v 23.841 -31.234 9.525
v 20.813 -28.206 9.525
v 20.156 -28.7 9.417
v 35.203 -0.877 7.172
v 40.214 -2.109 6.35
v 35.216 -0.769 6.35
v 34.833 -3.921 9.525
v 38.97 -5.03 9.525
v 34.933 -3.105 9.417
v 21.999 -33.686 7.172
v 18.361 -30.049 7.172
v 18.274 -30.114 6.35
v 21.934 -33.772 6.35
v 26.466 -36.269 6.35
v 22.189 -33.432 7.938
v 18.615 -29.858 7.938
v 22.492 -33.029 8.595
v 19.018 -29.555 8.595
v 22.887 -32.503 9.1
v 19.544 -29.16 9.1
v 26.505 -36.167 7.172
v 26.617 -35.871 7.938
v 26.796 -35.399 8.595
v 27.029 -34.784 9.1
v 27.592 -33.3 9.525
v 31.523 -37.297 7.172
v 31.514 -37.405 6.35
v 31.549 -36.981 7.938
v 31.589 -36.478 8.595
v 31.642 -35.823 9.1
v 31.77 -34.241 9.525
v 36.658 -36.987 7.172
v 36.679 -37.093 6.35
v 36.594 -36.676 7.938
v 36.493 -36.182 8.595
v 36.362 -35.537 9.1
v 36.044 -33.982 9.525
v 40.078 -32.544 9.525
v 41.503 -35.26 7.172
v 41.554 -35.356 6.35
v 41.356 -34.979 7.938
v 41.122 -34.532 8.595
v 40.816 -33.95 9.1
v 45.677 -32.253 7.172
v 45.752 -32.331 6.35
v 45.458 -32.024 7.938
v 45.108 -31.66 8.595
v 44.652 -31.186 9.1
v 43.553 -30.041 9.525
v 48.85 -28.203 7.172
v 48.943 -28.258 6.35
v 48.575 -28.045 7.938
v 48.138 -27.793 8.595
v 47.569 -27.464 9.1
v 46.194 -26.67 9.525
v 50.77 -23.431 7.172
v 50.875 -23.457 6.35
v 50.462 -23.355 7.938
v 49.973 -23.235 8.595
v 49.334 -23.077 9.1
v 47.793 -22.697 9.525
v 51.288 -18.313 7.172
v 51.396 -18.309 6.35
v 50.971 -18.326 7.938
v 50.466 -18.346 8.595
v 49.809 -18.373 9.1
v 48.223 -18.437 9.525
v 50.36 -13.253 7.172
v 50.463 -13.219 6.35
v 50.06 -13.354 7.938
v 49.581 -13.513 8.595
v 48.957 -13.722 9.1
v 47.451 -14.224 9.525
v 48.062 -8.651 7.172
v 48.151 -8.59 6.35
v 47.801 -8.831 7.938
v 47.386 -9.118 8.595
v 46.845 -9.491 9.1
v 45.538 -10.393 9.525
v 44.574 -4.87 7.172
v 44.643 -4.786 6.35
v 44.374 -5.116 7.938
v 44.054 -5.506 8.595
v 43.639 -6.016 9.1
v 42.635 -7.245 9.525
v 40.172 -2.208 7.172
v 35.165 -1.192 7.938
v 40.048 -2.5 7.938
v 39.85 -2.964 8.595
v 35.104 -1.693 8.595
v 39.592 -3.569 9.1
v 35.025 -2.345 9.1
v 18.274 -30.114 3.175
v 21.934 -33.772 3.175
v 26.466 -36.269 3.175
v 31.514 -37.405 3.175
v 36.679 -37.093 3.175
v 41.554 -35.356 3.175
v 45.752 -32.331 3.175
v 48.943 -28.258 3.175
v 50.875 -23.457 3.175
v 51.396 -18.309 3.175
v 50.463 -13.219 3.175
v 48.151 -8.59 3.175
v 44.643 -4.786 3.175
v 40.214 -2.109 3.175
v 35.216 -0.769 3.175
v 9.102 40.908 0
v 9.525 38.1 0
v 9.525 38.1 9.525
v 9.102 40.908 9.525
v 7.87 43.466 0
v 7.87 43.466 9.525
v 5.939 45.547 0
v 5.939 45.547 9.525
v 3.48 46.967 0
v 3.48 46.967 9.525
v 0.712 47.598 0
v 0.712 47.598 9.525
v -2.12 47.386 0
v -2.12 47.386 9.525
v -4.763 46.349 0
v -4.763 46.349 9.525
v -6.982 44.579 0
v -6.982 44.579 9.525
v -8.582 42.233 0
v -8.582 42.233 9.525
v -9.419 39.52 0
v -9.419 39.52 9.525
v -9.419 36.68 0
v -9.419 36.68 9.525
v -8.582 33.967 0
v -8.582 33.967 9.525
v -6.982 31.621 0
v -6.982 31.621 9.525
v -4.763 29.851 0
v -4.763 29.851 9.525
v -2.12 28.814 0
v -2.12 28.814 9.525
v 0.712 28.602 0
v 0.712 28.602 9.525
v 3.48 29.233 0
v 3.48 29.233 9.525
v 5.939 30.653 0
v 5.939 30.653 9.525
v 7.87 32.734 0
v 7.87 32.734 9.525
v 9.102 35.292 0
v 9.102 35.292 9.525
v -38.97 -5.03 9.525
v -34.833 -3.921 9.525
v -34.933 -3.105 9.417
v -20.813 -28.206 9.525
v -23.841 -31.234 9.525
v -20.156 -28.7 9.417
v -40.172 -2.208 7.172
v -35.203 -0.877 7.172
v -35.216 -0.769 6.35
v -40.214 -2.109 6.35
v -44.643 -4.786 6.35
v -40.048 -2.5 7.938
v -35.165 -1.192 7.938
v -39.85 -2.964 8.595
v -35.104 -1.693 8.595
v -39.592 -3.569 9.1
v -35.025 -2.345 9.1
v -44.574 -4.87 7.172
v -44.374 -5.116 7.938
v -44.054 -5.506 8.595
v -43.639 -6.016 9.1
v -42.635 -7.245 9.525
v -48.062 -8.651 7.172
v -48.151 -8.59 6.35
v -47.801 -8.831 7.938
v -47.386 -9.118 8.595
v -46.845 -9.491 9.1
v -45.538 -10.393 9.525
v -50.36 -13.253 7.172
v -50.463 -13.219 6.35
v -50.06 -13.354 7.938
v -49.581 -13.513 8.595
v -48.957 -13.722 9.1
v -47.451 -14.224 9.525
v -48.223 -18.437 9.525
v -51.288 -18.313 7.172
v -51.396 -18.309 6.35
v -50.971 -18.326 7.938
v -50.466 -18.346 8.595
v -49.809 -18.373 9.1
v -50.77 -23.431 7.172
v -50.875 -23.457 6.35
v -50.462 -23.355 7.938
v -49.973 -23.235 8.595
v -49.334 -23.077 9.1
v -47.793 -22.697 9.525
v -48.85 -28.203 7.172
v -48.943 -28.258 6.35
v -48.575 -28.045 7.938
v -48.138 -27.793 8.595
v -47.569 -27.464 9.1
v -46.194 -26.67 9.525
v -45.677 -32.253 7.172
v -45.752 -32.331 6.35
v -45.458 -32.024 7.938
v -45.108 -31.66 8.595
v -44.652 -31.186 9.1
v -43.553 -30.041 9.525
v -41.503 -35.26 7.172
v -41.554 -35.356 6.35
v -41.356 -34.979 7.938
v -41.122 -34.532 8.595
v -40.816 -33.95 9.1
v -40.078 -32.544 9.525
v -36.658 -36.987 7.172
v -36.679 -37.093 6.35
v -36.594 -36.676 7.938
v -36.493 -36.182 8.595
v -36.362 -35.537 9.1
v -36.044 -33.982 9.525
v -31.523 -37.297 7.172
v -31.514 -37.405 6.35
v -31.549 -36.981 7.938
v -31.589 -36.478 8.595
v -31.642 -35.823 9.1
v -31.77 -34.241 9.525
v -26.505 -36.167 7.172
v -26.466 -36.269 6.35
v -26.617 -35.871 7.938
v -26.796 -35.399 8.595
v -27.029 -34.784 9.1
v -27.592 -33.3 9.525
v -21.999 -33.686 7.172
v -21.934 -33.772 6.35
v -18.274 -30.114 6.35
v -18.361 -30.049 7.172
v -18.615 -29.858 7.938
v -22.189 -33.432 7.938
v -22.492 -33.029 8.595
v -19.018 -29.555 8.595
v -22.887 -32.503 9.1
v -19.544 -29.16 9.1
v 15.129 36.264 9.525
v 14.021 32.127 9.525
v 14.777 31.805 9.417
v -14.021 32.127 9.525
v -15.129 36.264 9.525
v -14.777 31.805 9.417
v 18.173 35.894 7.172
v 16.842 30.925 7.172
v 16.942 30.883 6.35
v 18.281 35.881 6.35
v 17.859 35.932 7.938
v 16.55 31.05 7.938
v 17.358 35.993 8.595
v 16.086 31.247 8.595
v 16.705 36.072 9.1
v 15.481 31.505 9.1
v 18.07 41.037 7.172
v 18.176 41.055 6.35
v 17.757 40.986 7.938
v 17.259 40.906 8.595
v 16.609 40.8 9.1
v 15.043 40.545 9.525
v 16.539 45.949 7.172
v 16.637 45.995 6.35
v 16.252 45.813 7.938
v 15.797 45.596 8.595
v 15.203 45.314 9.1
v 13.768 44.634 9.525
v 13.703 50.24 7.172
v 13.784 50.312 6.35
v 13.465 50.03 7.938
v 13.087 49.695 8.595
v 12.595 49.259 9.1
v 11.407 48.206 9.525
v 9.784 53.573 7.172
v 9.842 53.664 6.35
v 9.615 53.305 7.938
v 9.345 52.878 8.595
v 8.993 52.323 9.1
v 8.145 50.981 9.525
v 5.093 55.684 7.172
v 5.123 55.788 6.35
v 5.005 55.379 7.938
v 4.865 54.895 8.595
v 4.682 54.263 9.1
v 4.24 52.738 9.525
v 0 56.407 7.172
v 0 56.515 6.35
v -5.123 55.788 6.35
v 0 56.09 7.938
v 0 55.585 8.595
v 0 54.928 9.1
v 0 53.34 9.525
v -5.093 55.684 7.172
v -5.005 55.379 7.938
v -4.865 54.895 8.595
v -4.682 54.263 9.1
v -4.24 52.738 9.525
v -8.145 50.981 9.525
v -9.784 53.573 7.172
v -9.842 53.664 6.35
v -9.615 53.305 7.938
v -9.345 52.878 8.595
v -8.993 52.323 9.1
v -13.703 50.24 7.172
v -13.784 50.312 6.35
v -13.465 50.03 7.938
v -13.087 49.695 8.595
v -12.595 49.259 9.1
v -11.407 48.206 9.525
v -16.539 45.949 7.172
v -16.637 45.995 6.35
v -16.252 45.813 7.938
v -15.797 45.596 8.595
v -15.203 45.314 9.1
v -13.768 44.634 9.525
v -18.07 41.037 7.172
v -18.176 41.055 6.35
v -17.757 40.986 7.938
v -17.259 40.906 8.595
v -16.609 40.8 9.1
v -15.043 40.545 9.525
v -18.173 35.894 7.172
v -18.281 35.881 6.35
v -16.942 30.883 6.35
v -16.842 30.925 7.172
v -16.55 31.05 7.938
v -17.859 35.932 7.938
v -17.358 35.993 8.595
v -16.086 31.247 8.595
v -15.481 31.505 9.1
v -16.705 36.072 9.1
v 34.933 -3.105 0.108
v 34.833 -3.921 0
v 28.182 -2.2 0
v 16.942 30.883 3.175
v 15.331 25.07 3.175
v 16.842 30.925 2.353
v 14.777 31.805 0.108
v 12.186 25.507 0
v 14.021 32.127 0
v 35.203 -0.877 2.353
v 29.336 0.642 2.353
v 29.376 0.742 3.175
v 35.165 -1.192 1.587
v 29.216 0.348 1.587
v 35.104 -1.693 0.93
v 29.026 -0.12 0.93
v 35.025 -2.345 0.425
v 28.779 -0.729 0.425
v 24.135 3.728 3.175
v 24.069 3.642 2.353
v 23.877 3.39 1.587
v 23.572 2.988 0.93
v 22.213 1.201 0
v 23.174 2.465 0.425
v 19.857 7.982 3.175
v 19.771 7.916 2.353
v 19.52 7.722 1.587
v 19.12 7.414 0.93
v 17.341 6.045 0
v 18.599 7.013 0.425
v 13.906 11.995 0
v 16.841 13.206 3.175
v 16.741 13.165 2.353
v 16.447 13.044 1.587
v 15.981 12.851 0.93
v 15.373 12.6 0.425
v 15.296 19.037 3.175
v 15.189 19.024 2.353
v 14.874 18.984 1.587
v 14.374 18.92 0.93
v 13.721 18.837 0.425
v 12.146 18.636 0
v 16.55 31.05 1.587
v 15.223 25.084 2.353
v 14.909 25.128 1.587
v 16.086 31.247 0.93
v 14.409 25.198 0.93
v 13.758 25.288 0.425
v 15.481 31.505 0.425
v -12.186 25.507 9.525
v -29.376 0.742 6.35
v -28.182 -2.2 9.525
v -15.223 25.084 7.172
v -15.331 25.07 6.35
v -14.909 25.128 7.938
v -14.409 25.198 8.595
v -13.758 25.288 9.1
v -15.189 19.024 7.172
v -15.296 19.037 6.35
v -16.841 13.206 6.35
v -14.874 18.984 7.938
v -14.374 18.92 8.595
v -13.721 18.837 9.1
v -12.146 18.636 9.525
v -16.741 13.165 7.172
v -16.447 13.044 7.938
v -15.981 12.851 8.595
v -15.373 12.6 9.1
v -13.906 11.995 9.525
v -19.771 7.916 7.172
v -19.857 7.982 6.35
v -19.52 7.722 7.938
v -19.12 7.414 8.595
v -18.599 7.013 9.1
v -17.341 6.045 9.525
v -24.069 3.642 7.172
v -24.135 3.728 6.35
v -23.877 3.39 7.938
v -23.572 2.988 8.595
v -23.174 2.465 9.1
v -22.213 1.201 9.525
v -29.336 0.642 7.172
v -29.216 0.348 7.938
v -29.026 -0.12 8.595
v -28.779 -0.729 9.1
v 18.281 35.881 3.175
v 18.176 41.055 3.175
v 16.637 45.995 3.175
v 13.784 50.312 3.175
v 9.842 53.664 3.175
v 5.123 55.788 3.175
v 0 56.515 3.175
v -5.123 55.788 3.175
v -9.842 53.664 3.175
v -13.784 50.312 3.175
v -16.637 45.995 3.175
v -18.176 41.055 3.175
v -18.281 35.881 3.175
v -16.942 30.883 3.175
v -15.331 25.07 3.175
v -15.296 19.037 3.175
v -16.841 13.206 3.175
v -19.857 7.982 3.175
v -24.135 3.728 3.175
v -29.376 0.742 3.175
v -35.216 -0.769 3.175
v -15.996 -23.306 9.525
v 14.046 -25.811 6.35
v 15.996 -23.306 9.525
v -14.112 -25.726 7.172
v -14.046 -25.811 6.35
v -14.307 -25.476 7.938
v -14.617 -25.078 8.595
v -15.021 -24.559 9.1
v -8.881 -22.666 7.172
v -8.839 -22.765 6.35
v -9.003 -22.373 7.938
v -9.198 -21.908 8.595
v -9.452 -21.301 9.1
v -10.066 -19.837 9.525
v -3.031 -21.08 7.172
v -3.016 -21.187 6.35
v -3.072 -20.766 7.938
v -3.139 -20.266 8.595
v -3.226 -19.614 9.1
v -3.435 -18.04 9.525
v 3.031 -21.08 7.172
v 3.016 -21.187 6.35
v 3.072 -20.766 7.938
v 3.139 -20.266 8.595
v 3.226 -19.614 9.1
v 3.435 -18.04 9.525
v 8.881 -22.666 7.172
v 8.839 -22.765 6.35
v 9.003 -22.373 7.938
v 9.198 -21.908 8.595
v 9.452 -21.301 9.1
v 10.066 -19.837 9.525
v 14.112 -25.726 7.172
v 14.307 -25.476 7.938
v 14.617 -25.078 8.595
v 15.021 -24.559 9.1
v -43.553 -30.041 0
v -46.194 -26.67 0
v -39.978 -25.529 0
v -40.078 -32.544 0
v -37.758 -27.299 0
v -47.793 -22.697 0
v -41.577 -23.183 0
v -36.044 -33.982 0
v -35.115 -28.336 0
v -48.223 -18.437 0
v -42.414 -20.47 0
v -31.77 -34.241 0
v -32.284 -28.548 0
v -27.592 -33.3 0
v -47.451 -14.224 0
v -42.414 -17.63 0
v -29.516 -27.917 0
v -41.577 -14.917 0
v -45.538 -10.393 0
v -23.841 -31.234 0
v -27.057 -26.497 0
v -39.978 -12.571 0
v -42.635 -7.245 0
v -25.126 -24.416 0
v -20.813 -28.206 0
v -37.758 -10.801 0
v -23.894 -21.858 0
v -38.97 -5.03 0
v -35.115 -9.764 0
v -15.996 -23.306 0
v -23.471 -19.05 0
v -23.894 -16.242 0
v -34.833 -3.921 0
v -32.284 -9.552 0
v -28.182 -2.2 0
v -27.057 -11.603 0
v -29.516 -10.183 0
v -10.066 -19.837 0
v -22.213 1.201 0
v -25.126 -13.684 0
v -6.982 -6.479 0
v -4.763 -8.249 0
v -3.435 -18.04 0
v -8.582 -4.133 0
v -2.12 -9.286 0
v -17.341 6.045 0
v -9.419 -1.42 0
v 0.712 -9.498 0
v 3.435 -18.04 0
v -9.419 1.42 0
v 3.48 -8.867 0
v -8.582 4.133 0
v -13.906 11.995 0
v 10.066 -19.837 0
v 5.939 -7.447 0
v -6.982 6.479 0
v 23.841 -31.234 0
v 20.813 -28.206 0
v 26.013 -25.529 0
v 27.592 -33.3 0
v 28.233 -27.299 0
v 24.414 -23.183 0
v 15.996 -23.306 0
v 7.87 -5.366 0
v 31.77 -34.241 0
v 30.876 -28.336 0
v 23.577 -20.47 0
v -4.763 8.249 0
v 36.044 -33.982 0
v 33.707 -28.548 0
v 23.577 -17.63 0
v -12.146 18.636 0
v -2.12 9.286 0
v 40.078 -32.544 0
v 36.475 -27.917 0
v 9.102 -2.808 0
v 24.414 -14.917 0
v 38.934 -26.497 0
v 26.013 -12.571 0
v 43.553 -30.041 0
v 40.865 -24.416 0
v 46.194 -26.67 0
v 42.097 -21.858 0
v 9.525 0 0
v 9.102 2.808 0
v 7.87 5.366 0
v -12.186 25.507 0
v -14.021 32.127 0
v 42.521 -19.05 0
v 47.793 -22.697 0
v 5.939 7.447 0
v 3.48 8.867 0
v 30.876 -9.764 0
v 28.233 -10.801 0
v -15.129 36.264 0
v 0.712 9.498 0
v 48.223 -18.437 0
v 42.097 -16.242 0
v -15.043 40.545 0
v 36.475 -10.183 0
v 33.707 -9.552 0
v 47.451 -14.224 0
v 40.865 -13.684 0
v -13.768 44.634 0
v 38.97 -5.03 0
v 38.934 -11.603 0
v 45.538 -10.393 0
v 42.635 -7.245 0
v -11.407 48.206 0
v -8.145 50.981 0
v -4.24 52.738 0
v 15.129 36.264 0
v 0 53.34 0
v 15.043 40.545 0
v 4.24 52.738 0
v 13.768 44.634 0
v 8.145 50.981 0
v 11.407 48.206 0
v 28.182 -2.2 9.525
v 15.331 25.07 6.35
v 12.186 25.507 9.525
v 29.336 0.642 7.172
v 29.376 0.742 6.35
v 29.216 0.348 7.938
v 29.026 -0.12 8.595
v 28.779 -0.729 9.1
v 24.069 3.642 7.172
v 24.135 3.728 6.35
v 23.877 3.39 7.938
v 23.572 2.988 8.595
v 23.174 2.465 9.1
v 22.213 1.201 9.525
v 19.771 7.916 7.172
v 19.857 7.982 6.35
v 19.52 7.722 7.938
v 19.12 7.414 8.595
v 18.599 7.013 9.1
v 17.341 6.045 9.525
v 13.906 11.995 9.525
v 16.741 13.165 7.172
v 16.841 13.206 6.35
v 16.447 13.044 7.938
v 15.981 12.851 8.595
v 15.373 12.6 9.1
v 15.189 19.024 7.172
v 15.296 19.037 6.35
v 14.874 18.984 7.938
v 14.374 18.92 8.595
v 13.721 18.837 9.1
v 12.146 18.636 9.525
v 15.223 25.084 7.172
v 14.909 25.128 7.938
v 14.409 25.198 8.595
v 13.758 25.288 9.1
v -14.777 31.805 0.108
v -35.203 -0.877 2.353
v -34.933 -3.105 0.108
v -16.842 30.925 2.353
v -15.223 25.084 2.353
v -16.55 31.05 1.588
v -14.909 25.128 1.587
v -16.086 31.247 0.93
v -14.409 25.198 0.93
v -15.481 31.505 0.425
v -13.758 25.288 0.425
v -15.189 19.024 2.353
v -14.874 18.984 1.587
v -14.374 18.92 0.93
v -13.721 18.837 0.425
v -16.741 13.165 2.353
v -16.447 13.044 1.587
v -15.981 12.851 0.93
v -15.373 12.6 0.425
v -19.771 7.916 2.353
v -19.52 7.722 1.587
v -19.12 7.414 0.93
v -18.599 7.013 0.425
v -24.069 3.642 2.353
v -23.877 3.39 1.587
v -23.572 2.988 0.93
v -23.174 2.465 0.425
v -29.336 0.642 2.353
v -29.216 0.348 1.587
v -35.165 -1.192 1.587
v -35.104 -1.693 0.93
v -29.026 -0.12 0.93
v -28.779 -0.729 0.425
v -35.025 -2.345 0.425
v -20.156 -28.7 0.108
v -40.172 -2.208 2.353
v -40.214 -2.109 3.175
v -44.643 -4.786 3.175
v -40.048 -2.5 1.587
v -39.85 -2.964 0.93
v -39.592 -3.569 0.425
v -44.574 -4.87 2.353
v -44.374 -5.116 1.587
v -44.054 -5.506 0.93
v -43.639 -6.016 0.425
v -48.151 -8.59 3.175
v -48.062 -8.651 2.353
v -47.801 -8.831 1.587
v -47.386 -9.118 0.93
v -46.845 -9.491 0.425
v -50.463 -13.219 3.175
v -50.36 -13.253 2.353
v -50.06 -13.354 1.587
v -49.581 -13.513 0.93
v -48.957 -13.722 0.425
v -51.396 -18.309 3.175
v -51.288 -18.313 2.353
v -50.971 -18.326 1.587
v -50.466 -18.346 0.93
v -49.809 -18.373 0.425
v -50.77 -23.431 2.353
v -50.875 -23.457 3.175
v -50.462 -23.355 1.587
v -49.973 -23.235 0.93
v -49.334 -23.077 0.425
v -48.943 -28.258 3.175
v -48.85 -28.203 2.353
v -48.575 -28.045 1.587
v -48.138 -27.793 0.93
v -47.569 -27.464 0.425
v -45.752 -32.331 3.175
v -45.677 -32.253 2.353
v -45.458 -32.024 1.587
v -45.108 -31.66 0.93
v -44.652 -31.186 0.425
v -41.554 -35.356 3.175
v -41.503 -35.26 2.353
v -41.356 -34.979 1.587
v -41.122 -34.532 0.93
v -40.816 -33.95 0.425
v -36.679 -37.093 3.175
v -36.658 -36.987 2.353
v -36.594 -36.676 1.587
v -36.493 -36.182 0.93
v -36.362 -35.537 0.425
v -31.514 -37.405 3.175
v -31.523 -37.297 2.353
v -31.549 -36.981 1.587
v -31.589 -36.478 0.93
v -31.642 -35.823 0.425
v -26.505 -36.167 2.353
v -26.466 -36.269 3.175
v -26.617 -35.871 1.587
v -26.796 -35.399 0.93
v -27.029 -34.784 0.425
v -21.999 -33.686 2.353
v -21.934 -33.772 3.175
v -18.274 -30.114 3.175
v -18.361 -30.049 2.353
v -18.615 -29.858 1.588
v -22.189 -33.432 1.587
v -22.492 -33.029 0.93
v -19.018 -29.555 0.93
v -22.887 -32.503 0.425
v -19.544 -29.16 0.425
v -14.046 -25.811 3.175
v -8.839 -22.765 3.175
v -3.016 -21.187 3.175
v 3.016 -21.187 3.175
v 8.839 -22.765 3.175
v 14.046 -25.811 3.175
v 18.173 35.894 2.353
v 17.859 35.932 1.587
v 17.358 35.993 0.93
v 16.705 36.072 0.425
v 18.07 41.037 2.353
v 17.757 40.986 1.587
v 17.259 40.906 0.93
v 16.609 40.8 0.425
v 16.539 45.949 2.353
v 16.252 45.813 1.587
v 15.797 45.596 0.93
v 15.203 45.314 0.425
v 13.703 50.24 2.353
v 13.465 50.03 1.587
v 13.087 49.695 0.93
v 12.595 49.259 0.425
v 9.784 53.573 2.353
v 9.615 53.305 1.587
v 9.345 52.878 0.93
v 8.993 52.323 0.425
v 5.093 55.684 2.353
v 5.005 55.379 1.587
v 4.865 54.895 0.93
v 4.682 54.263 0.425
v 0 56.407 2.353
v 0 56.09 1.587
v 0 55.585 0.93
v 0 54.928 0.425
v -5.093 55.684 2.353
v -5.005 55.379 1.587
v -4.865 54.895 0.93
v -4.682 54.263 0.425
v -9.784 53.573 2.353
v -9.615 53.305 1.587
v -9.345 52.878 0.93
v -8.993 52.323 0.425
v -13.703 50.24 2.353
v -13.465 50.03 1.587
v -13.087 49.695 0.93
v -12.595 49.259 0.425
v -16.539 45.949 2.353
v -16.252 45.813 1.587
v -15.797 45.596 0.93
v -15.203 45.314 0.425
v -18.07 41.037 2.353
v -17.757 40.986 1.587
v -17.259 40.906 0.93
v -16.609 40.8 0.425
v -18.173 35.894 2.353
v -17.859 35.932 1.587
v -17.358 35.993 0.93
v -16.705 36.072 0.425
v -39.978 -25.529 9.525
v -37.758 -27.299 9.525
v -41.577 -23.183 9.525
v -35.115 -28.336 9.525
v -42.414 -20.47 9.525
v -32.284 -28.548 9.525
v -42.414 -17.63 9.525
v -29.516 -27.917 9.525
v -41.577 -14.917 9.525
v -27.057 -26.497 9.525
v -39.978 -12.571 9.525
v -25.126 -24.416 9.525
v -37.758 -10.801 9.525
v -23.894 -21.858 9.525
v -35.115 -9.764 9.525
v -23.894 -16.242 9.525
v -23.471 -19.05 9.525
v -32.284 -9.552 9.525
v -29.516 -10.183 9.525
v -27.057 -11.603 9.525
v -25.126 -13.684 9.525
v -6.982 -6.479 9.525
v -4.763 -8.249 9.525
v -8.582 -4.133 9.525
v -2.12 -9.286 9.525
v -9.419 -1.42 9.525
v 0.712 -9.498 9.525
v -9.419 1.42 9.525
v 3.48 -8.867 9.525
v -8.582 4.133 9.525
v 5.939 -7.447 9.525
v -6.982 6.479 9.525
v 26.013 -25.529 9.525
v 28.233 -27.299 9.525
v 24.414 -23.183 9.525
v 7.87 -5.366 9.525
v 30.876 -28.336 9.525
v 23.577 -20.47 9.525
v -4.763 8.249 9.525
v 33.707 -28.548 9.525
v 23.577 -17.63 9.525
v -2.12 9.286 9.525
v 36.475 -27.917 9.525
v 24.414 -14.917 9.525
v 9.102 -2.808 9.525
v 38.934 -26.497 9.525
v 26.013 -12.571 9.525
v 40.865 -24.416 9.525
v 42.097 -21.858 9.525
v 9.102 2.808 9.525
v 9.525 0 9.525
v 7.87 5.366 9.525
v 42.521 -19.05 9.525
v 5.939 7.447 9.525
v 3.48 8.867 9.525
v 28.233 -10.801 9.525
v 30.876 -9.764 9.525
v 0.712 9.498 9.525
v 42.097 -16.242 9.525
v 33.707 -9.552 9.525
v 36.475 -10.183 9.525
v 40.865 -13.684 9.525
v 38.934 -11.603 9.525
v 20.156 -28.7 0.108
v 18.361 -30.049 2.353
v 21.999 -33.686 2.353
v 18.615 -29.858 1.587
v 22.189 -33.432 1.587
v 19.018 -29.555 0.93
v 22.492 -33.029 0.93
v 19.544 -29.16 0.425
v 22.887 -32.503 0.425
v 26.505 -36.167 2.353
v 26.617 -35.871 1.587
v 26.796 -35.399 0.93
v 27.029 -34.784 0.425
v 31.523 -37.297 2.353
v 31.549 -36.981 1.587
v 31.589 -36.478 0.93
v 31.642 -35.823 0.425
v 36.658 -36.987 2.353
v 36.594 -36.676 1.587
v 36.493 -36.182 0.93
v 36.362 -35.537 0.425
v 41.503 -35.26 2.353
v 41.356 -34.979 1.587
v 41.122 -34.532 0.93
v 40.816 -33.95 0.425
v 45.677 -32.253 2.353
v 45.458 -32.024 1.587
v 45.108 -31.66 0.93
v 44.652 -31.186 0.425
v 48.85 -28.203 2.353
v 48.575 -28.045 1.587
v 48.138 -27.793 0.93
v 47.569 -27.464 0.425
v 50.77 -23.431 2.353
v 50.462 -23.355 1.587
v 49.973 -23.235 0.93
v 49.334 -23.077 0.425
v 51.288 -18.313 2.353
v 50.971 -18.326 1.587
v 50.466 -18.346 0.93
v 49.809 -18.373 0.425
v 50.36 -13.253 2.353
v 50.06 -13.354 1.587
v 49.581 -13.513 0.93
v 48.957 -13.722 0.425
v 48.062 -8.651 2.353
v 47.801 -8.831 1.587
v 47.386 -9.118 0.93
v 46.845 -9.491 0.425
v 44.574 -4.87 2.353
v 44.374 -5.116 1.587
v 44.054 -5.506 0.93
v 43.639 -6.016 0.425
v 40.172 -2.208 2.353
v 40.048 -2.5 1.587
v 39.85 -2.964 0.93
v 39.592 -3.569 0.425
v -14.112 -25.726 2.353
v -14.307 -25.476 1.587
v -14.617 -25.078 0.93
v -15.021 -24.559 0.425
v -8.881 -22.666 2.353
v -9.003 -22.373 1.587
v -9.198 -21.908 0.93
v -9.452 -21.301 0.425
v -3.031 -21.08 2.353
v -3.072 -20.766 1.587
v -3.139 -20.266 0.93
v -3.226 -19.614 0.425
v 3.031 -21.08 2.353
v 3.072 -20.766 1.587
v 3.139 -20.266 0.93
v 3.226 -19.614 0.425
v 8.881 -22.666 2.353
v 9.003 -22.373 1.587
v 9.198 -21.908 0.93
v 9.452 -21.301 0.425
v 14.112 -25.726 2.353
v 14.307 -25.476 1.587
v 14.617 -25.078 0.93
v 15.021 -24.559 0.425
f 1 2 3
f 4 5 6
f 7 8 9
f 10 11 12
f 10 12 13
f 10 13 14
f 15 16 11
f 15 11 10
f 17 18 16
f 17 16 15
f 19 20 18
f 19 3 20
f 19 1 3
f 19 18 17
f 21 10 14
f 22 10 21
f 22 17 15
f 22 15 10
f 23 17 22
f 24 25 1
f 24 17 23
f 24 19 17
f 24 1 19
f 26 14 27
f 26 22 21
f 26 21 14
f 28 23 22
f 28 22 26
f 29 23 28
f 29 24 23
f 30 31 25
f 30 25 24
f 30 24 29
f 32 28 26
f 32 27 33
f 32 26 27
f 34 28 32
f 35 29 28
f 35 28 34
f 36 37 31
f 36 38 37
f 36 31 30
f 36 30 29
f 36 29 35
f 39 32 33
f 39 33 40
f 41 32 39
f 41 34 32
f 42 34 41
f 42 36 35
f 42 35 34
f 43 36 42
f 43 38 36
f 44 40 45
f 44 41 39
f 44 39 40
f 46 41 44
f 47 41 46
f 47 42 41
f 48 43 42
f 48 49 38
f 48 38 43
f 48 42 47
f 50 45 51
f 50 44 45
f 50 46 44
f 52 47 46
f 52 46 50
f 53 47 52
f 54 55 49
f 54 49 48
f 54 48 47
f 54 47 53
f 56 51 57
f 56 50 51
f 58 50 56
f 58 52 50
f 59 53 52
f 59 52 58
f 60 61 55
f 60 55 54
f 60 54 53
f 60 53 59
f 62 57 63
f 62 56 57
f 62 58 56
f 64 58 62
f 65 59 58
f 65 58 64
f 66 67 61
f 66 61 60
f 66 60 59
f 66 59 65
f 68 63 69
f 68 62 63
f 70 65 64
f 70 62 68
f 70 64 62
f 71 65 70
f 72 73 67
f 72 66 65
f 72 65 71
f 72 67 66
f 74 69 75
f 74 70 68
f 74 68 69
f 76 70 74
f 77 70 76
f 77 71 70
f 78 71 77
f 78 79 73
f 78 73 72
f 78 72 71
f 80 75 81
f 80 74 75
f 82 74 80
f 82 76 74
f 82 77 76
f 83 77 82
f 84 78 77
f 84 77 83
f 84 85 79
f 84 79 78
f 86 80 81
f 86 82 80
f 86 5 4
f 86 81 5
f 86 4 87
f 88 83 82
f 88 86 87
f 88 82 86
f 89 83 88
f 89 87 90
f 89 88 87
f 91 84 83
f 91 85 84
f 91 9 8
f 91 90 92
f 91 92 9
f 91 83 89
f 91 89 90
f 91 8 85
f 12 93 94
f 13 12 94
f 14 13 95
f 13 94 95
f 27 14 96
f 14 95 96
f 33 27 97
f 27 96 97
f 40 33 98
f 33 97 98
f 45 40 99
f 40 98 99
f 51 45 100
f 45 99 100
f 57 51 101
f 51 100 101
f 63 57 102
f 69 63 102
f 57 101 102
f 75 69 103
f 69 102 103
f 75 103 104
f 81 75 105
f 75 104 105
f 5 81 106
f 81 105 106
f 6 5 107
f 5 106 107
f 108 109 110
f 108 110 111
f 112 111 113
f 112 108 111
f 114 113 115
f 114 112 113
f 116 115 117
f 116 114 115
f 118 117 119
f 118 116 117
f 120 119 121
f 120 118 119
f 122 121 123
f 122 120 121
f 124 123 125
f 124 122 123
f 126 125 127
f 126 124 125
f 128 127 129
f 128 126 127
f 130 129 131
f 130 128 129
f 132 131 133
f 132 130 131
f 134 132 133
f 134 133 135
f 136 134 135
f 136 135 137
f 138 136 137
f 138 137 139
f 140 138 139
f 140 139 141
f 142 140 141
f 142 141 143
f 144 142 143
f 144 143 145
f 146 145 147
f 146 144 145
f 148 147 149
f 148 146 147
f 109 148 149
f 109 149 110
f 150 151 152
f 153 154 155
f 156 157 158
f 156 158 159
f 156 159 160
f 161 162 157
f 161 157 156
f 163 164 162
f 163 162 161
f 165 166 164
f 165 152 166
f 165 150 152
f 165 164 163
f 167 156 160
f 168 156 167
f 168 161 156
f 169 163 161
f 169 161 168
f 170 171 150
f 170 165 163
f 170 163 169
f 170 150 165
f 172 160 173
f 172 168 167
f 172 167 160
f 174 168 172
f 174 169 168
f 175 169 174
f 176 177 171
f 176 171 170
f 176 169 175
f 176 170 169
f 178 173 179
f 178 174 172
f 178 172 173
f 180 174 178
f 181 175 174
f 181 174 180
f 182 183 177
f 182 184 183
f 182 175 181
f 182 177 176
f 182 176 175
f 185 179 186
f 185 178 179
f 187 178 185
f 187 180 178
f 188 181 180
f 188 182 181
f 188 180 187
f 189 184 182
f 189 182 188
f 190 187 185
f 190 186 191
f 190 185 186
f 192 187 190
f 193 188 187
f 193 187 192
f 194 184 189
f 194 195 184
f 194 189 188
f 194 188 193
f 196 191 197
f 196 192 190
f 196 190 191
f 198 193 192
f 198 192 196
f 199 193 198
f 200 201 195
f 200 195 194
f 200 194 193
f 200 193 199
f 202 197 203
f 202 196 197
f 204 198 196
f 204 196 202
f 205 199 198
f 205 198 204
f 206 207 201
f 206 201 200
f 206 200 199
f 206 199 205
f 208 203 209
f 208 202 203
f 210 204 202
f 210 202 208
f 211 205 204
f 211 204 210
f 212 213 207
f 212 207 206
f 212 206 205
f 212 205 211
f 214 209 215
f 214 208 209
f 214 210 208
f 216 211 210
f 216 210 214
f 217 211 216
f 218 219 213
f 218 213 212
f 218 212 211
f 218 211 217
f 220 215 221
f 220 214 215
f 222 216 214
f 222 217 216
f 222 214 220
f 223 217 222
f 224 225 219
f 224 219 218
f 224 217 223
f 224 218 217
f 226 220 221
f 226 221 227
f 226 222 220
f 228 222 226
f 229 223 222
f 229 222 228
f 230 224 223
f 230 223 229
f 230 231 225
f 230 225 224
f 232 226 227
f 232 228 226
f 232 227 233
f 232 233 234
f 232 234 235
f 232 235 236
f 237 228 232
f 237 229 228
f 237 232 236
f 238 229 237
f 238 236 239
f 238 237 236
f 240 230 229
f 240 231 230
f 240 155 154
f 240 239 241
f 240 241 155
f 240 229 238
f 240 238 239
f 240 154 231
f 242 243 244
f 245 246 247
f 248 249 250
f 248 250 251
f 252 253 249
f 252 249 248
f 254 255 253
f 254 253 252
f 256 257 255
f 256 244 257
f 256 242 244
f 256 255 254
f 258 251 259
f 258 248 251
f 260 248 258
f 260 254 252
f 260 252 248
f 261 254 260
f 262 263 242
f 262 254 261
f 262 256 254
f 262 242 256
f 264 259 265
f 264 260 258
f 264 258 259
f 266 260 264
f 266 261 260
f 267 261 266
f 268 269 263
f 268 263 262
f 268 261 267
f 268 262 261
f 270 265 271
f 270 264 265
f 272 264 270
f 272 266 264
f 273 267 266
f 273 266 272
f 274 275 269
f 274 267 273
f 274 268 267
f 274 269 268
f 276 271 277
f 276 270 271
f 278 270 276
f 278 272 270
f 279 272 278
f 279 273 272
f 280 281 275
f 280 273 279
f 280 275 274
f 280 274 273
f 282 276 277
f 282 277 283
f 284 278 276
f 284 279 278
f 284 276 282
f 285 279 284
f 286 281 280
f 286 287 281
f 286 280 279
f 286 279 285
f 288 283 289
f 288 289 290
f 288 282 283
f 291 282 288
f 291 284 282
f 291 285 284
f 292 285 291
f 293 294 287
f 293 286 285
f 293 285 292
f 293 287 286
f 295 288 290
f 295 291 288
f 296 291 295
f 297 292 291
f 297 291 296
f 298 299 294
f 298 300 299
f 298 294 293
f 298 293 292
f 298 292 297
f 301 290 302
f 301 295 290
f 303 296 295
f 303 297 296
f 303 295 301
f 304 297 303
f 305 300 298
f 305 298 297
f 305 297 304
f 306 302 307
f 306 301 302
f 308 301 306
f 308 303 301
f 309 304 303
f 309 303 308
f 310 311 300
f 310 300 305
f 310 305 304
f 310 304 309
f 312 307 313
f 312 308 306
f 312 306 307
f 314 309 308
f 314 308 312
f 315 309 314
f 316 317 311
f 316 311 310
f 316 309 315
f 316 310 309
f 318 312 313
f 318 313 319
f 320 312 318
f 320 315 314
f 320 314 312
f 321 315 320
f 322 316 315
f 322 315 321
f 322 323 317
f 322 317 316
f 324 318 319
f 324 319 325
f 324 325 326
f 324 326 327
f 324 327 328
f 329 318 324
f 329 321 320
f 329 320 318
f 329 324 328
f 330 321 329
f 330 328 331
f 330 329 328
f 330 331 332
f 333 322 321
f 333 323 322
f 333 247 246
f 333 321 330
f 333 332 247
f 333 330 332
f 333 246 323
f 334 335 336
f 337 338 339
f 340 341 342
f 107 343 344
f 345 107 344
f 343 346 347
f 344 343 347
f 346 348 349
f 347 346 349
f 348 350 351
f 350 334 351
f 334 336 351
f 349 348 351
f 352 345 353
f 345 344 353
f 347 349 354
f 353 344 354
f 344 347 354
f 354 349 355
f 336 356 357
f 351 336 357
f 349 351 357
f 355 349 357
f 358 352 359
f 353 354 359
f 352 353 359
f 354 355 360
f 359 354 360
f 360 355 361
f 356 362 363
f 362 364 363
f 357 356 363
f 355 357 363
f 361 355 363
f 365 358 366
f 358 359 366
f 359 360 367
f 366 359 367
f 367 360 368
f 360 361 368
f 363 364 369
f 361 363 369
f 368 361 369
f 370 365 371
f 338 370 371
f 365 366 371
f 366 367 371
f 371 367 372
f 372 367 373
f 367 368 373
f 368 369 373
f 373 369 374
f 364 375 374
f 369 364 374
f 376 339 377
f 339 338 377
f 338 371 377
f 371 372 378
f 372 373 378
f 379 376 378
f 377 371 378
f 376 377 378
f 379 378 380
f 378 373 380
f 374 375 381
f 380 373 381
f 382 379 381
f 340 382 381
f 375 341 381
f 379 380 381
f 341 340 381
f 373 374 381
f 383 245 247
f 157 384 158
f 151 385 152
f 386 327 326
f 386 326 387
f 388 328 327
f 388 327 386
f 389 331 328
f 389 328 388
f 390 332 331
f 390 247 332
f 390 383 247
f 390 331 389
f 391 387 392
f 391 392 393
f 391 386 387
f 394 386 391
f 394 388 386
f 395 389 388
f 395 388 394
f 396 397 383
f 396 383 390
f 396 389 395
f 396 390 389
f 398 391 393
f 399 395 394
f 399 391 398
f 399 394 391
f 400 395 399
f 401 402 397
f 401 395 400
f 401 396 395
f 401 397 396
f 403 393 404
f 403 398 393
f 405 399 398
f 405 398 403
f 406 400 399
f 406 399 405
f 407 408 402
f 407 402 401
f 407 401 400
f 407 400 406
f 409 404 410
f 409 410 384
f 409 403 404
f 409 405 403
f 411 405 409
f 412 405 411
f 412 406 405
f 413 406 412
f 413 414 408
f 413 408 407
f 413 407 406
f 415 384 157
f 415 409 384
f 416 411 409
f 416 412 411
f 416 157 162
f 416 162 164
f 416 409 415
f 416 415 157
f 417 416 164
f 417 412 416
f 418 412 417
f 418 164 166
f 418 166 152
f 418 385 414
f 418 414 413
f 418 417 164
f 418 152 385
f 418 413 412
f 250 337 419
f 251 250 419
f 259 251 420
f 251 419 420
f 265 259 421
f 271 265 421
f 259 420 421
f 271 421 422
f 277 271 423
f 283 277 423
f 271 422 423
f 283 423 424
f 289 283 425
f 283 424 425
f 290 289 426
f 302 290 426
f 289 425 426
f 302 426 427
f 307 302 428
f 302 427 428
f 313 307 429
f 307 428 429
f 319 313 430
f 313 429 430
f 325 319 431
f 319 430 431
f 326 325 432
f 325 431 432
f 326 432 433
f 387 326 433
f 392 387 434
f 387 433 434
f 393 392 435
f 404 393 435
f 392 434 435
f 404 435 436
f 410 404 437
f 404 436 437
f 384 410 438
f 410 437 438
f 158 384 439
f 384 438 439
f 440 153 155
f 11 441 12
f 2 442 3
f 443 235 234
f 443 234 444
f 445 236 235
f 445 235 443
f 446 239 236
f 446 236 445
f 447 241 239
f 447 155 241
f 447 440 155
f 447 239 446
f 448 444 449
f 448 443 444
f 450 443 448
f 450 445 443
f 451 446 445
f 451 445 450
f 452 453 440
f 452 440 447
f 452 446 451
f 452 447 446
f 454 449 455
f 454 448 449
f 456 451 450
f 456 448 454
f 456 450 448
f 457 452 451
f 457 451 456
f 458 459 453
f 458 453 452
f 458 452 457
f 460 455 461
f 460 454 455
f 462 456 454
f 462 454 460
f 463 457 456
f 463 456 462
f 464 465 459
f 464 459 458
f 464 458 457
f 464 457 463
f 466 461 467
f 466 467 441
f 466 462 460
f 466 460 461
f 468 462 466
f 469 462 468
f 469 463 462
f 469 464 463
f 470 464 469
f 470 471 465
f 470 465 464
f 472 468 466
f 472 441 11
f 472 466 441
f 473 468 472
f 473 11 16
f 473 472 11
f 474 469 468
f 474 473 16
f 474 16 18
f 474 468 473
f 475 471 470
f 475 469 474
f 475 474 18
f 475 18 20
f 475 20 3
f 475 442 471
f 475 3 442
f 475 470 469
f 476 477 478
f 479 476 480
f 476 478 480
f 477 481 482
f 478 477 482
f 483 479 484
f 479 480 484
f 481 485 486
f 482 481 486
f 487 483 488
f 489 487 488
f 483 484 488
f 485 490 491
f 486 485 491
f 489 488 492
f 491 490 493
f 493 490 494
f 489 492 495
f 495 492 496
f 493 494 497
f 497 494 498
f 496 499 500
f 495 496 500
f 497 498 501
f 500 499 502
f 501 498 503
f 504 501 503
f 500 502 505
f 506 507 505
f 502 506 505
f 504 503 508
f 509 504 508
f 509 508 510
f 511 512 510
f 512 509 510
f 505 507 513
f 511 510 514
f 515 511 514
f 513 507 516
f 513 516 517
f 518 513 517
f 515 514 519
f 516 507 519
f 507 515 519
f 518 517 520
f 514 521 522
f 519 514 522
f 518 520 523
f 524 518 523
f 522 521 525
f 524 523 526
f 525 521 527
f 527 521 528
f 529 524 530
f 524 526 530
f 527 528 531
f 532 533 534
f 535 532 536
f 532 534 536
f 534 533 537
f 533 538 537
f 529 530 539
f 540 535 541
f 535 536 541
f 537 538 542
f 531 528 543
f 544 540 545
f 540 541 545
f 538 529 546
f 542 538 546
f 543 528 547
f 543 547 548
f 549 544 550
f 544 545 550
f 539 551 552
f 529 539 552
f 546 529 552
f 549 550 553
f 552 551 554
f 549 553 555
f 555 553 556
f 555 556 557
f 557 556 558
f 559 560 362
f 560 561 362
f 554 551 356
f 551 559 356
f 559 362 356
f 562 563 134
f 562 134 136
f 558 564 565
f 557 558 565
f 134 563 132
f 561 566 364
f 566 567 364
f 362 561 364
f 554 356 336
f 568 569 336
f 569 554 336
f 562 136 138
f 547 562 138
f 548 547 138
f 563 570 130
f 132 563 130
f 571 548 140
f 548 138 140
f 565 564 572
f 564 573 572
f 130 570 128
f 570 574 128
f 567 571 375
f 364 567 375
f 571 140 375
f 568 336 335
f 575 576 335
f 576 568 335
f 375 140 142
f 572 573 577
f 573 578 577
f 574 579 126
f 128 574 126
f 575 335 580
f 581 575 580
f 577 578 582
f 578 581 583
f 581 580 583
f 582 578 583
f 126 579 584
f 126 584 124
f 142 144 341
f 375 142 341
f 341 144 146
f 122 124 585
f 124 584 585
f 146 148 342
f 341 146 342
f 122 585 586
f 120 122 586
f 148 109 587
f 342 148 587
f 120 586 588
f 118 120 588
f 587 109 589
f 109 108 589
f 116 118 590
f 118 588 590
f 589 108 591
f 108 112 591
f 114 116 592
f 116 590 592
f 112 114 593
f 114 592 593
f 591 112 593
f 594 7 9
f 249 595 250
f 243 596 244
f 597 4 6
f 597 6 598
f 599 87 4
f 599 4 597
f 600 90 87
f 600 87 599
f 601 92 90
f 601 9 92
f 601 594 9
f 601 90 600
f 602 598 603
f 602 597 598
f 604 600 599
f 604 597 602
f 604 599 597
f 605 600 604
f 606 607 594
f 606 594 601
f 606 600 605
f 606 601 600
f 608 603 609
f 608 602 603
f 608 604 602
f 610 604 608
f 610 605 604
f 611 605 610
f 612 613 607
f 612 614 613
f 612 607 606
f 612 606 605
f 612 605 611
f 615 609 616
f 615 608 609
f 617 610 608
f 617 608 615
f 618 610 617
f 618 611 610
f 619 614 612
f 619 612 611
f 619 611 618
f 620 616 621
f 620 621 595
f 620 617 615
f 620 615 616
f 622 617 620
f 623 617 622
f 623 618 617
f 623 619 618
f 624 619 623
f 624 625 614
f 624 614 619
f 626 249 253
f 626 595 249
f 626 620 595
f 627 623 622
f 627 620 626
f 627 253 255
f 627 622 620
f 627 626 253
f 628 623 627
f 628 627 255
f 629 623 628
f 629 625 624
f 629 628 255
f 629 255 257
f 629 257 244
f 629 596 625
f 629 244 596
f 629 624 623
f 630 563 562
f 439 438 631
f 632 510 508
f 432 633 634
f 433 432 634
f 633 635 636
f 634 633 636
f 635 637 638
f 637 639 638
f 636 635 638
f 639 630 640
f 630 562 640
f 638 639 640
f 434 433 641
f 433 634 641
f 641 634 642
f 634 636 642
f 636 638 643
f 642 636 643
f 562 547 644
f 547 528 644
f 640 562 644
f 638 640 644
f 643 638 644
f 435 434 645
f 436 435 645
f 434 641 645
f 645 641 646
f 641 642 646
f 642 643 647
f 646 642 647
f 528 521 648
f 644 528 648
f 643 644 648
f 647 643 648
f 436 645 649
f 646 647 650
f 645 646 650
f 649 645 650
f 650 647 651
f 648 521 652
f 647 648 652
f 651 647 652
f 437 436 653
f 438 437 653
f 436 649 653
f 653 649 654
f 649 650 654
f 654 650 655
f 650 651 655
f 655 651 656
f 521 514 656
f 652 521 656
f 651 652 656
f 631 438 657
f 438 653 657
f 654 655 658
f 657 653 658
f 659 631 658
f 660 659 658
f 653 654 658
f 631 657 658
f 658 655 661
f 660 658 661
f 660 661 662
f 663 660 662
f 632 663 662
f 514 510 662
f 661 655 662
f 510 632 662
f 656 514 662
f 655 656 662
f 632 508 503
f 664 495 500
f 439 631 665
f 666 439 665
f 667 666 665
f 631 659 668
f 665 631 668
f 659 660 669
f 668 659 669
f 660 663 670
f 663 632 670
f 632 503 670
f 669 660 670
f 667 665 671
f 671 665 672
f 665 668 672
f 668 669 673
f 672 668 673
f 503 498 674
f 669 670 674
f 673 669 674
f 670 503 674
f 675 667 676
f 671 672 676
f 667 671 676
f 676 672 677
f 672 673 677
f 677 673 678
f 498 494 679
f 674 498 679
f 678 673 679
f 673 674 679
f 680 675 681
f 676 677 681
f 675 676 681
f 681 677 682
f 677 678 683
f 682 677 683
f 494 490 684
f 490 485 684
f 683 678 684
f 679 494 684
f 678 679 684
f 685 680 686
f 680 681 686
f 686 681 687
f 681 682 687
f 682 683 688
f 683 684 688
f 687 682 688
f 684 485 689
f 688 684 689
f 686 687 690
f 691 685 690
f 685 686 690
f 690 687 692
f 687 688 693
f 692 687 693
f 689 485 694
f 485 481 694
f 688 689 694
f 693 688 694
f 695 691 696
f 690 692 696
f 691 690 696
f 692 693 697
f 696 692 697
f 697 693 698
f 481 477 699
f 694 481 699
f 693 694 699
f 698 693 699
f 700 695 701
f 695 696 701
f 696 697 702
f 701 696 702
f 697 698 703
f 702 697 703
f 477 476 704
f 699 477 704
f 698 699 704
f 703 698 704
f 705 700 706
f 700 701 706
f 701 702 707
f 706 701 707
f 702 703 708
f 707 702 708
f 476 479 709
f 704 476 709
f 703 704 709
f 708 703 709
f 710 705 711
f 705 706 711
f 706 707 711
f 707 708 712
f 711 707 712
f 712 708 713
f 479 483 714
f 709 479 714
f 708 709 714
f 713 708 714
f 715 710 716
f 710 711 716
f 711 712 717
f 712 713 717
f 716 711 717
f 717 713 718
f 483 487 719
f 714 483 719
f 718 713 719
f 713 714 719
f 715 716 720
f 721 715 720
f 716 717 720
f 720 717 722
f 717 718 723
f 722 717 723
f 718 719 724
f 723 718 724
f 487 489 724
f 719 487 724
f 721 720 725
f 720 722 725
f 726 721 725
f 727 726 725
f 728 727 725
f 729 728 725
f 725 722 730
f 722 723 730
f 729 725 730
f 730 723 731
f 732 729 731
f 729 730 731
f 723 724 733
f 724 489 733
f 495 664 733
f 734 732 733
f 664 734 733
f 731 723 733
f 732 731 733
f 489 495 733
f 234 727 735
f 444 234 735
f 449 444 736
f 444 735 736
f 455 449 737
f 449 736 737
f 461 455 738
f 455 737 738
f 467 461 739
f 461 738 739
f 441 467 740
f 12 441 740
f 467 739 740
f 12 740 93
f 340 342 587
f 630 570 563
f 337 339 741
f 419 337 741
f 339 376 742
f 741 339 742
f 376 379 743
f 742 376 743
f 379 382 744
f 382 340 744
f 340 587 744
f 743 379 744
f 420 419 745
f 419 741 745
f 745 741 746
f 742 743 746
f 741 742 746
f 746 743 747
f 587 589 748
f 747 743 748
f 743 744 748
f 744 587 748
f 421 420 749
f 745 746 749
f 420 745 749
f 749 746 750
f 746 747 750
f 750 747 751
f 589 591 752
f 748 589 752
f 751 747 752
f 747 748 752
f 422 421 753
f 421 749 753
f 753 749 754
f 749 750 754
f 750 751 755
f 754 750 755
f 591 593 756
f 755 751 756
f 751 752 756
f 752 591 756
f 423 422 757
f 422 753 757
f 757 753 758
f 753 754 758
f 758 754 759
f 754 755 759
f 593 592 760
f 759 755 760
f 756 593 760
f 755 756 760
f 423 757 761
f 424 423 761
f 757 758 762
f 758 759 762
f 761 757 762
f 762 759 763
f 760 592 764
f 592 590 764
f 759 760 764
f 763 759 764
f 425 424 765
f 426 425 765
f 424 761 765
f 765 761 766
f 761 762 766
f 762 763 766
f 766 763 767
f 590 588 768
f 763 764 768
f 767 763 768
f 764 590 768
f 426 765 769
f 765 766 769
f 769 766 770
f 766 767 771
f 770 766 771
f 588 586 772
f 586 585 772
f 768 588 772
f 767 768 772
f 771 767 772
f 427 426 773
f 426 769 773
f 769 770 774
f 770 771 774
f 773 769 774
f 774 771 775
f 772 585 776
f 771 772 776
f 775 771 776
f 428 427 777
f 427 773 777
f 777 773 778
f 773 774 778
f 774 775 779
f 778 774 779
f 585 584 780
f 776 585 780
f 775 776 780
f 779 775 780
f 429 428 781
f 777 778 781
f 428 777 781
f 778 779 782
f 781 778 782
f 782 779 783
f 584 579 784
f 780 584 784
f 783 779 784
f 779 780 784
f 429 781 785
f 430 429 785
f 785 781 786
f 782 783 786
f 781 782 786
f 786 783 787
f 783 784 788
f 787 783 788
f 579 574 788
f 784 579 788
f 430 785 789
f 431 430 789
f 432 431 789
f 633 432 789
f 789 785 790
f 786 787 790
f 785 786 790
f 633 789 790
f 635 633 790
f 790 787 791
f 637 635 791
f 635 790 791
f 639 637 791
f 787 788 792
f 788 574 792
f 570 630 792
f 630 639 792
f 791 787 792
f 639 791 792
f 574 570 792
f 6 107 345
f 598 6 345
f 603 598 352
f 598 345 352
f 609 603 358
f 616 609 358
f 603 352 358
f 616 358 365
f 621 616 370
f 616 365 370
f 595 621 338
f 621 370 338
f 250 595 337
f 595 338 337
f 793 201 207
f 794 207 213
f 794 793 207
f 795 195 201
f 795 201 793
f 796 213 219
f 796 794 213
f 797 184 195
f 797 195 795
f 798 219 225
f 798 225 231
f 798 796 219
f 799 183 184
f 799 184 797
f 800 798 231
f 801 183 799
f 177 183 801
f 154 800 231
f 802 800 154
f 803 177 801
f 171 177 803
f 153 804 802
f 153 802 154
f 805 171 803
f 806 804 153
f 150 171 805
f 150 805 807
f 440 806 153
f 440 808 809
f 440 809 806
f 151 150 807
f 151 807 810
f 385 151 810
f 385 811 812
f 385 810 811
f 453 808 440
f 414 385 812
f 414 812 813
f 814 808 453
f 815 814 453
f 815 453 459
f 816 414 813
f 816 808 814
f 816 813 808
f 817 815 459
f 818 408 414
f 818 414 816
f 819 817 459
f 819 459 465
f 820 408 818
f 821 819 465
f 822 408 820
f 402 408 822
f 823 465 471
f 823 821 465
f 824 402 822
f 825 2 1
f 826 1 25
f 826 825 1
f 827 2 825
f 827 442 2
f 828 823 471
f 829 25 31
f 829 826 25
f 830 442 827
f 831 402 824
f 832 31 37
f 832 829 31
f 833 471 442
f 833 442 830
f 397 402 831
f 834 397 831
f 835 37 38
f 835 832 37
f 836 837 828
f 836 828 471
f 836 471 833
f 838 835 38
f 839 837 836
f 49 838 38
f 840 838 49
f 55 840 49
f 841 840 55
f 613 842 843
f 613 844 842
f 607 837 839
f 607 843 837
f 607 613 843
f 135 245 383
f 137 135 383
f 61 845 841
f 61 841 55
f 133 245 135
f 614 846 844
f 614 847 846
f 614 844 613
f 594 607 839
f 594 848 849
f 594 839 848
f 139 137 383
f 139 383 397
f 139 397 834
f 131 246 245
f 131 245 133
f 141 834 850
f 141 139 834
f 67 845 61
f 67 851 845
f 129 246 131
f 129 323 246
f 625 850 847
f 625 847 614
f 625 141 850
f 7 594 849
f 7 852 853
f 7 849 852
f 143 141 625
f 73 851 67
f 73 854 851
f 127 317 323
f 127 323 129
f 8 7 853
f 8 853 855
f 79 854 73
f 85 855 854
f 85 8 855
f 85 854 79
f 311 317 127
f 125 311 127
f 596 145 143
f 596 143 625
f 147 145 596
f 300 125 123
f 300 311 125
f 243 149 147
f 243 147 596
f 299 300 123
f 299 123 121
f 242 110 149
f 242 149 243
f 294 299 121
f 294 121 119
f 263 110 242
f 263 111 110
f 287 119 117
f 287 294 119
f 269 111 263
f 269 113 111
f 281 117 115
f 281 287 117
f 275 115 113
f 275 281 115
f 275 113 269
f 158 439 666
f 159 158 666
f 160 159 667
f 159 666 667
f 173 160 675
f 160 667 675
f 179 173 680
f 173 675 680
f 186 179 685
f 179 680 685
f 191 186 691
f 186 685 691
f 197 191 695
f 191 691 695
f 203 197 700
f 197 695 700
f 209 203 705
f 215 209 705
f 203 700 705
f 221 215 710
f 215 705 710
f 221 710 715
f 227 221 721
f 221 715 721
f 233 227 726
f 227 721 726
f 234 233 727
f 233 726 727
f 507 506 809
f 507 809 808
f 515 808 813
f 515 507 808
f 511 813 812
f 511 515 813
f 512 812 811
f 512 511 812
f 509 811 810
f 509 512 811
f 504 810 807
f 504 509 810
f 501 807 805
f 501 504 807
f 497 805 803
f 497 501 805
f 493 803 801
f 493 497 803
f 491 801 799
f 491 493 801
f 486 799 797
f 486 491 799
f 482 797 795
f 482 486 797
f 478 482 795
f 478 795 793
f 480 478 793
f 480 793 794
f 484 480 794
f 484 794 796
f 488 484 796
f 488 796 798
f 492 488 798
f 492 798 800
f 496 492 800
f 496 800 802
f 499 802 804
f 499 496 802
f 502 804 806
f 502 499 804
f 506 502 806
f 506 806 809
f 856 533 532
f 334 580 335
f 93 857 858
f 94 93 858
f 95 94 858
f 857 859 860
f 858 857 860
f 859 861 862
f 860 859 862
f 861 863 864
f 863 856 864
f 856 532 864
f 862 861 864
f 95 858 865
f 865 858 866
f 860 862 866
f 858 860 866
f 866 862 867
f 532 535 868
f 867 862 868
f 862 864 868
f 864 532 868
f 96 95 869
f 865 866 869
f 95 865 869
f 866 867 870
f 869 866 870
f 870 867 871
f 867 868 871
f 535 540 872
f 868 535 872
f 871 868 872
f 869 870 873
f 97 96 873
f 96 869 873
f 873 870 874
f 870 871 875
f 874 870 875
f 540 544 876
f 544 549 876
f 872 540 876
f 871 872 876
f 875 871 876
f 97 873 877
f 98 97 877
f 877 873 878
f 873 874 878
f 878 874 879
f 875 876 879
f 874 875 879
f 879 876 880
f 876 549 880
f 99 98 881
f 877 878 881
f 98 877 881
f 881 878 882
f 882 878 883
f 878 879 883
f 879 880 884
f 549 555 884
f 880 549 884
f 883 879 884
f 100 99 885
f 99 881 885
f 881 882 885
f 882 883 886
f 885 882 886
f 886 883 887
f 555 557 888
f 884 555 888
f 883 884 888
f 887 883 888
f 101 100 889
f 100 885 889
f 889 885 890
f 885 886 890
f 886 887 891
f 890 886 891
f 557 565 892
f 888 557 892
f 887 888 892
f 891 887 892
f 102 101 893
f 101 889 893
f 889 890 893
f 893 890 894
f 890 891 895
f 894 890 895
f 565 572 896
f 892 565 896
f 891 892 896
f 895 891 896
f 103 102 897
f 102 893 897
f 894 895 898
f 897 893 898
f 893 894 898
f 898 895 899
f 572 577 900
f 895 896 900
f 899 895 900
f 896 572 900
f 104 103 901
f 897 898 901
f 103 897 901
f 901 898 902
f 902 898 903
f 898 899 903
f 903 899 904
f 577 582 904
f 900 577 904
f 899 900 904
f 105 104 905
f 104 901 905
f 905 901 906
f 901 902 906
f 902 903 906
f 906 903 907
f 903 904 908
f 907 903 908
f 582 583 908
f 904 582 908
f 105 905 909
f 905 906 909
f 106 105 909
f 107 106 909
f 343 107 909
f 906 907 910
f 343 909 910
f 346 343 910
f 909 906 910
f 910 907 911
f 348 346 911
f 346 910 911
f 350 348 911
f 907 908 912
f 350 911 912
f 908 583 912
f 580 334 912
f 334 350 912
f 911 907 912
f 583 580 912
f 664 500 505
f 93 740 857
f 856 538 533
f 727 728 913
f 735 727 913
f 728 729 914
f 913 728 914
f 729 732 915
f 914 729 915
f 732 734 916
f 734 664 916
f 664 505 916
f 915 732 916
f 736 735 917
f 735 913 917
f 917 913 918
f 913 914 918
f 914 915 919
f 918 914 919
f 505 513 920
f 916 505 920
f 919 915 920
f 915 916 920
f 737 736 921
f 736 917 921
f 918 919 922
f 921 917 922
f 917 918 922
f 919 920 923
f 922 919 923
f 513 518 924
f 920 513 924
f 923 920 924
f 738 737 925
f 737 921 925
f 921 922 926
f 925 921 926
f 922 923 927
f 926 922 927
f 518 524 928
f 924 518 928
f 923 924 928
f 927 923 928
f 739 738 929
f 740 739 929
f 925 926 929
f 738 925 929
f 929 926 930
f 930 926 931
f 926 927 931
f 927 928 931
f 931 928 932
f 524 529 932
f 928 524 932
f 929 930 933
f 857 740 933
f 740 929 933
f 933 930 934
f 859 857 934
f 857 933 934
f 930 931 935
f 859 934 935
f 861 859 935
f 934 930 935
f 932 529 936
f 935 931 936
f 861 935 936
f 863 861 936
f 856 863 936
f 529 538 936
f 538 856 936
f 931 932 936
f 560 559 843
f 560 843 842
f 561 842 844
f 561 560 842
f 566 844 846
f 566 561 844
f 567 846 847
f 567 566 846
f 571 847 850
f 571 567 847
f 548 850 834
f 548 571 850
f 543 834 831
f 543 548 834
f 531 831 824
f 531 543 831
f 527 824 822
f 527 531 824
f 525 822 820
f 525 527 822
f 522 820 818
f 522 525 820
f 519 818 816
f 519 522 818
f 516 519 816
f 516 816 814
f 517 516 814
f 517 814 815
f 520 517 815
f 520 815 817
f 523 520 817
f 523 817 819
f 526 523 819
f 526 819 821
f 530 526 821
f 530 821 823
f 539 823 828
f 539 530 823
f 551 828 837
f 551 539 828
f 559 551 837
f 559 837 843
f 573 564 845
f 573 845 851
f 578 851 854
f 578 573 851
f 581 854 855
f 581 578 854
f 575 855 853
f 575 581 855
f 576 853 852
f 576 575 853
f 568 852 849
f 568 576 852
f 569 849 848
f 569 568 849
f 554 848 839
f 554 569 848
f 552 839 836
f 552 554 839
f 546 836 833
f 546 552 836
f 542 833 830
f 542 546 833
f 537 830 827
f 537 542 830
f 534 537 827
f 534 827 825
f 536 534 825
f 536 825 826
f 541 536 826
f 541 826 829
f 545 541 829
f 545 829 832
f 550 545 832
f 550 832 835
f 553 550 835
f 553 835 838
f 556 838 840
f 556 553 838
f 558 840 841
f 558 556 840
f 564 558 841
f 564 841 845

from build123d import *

# Parameters (mm, degrees)
F0_R     = 9.525
F1_DEPTH = 9.525
F2_R     = 3.175


with BuildPart() as f1:
    # F0 (on Top) → F1 (new body)
    with BuildSketch(Plane.XY):
        with BuildLine():
            ThreePointArc((35.216307, -0.769394), (18.175745, 10.493771), (16.941838, 30.882913))
            ThreePointArc((16.941838, 30.882913), (0, 56.515), (-16.941838, 30.882913))
            ThreePointArc((-16.941838, 30.882913), (-18.175745, 10.493771), (-35.216307, -0.769394))
            ThreePointArc((-35.216307, -0.769394), (-48.943426, -28.2575), (-18.274468, -30.113519))
            ThreePointArc((-18.274468, -30.113519), (0, -20.987543), (18.274468, -30.113519))
            ThreePointArc((18.274468, -30.113519), (48.943426, -28.2575), (35.216307, -0.769394))
        make_face()
        with Locations((-32.995568, -19.05)):
            Circle(F0_R, mode=Mode.SUBTRACT)
        Circle(F0_R, mode=Mode.SUBTRACT)
        with Locations((32.995568, -19.05)):
            Circle(F0_R, mode=Mode.SUBTRACT)
        with Locations((0, 38.1)):
            Circle(F0_R, mode=Mode.SUBTRACT)
    extrude(amount=F1_DEPTH)

    # F2
    f2_edges = [f1.edges().sort_by_distance(p)[0] for p in [
        (-18.175745, 10.493771, 9.525),
        (18.175745, 10.493771, 0),
    ]]
    fillet(f2_edges, radius=F2_R)


solid = f1.part
